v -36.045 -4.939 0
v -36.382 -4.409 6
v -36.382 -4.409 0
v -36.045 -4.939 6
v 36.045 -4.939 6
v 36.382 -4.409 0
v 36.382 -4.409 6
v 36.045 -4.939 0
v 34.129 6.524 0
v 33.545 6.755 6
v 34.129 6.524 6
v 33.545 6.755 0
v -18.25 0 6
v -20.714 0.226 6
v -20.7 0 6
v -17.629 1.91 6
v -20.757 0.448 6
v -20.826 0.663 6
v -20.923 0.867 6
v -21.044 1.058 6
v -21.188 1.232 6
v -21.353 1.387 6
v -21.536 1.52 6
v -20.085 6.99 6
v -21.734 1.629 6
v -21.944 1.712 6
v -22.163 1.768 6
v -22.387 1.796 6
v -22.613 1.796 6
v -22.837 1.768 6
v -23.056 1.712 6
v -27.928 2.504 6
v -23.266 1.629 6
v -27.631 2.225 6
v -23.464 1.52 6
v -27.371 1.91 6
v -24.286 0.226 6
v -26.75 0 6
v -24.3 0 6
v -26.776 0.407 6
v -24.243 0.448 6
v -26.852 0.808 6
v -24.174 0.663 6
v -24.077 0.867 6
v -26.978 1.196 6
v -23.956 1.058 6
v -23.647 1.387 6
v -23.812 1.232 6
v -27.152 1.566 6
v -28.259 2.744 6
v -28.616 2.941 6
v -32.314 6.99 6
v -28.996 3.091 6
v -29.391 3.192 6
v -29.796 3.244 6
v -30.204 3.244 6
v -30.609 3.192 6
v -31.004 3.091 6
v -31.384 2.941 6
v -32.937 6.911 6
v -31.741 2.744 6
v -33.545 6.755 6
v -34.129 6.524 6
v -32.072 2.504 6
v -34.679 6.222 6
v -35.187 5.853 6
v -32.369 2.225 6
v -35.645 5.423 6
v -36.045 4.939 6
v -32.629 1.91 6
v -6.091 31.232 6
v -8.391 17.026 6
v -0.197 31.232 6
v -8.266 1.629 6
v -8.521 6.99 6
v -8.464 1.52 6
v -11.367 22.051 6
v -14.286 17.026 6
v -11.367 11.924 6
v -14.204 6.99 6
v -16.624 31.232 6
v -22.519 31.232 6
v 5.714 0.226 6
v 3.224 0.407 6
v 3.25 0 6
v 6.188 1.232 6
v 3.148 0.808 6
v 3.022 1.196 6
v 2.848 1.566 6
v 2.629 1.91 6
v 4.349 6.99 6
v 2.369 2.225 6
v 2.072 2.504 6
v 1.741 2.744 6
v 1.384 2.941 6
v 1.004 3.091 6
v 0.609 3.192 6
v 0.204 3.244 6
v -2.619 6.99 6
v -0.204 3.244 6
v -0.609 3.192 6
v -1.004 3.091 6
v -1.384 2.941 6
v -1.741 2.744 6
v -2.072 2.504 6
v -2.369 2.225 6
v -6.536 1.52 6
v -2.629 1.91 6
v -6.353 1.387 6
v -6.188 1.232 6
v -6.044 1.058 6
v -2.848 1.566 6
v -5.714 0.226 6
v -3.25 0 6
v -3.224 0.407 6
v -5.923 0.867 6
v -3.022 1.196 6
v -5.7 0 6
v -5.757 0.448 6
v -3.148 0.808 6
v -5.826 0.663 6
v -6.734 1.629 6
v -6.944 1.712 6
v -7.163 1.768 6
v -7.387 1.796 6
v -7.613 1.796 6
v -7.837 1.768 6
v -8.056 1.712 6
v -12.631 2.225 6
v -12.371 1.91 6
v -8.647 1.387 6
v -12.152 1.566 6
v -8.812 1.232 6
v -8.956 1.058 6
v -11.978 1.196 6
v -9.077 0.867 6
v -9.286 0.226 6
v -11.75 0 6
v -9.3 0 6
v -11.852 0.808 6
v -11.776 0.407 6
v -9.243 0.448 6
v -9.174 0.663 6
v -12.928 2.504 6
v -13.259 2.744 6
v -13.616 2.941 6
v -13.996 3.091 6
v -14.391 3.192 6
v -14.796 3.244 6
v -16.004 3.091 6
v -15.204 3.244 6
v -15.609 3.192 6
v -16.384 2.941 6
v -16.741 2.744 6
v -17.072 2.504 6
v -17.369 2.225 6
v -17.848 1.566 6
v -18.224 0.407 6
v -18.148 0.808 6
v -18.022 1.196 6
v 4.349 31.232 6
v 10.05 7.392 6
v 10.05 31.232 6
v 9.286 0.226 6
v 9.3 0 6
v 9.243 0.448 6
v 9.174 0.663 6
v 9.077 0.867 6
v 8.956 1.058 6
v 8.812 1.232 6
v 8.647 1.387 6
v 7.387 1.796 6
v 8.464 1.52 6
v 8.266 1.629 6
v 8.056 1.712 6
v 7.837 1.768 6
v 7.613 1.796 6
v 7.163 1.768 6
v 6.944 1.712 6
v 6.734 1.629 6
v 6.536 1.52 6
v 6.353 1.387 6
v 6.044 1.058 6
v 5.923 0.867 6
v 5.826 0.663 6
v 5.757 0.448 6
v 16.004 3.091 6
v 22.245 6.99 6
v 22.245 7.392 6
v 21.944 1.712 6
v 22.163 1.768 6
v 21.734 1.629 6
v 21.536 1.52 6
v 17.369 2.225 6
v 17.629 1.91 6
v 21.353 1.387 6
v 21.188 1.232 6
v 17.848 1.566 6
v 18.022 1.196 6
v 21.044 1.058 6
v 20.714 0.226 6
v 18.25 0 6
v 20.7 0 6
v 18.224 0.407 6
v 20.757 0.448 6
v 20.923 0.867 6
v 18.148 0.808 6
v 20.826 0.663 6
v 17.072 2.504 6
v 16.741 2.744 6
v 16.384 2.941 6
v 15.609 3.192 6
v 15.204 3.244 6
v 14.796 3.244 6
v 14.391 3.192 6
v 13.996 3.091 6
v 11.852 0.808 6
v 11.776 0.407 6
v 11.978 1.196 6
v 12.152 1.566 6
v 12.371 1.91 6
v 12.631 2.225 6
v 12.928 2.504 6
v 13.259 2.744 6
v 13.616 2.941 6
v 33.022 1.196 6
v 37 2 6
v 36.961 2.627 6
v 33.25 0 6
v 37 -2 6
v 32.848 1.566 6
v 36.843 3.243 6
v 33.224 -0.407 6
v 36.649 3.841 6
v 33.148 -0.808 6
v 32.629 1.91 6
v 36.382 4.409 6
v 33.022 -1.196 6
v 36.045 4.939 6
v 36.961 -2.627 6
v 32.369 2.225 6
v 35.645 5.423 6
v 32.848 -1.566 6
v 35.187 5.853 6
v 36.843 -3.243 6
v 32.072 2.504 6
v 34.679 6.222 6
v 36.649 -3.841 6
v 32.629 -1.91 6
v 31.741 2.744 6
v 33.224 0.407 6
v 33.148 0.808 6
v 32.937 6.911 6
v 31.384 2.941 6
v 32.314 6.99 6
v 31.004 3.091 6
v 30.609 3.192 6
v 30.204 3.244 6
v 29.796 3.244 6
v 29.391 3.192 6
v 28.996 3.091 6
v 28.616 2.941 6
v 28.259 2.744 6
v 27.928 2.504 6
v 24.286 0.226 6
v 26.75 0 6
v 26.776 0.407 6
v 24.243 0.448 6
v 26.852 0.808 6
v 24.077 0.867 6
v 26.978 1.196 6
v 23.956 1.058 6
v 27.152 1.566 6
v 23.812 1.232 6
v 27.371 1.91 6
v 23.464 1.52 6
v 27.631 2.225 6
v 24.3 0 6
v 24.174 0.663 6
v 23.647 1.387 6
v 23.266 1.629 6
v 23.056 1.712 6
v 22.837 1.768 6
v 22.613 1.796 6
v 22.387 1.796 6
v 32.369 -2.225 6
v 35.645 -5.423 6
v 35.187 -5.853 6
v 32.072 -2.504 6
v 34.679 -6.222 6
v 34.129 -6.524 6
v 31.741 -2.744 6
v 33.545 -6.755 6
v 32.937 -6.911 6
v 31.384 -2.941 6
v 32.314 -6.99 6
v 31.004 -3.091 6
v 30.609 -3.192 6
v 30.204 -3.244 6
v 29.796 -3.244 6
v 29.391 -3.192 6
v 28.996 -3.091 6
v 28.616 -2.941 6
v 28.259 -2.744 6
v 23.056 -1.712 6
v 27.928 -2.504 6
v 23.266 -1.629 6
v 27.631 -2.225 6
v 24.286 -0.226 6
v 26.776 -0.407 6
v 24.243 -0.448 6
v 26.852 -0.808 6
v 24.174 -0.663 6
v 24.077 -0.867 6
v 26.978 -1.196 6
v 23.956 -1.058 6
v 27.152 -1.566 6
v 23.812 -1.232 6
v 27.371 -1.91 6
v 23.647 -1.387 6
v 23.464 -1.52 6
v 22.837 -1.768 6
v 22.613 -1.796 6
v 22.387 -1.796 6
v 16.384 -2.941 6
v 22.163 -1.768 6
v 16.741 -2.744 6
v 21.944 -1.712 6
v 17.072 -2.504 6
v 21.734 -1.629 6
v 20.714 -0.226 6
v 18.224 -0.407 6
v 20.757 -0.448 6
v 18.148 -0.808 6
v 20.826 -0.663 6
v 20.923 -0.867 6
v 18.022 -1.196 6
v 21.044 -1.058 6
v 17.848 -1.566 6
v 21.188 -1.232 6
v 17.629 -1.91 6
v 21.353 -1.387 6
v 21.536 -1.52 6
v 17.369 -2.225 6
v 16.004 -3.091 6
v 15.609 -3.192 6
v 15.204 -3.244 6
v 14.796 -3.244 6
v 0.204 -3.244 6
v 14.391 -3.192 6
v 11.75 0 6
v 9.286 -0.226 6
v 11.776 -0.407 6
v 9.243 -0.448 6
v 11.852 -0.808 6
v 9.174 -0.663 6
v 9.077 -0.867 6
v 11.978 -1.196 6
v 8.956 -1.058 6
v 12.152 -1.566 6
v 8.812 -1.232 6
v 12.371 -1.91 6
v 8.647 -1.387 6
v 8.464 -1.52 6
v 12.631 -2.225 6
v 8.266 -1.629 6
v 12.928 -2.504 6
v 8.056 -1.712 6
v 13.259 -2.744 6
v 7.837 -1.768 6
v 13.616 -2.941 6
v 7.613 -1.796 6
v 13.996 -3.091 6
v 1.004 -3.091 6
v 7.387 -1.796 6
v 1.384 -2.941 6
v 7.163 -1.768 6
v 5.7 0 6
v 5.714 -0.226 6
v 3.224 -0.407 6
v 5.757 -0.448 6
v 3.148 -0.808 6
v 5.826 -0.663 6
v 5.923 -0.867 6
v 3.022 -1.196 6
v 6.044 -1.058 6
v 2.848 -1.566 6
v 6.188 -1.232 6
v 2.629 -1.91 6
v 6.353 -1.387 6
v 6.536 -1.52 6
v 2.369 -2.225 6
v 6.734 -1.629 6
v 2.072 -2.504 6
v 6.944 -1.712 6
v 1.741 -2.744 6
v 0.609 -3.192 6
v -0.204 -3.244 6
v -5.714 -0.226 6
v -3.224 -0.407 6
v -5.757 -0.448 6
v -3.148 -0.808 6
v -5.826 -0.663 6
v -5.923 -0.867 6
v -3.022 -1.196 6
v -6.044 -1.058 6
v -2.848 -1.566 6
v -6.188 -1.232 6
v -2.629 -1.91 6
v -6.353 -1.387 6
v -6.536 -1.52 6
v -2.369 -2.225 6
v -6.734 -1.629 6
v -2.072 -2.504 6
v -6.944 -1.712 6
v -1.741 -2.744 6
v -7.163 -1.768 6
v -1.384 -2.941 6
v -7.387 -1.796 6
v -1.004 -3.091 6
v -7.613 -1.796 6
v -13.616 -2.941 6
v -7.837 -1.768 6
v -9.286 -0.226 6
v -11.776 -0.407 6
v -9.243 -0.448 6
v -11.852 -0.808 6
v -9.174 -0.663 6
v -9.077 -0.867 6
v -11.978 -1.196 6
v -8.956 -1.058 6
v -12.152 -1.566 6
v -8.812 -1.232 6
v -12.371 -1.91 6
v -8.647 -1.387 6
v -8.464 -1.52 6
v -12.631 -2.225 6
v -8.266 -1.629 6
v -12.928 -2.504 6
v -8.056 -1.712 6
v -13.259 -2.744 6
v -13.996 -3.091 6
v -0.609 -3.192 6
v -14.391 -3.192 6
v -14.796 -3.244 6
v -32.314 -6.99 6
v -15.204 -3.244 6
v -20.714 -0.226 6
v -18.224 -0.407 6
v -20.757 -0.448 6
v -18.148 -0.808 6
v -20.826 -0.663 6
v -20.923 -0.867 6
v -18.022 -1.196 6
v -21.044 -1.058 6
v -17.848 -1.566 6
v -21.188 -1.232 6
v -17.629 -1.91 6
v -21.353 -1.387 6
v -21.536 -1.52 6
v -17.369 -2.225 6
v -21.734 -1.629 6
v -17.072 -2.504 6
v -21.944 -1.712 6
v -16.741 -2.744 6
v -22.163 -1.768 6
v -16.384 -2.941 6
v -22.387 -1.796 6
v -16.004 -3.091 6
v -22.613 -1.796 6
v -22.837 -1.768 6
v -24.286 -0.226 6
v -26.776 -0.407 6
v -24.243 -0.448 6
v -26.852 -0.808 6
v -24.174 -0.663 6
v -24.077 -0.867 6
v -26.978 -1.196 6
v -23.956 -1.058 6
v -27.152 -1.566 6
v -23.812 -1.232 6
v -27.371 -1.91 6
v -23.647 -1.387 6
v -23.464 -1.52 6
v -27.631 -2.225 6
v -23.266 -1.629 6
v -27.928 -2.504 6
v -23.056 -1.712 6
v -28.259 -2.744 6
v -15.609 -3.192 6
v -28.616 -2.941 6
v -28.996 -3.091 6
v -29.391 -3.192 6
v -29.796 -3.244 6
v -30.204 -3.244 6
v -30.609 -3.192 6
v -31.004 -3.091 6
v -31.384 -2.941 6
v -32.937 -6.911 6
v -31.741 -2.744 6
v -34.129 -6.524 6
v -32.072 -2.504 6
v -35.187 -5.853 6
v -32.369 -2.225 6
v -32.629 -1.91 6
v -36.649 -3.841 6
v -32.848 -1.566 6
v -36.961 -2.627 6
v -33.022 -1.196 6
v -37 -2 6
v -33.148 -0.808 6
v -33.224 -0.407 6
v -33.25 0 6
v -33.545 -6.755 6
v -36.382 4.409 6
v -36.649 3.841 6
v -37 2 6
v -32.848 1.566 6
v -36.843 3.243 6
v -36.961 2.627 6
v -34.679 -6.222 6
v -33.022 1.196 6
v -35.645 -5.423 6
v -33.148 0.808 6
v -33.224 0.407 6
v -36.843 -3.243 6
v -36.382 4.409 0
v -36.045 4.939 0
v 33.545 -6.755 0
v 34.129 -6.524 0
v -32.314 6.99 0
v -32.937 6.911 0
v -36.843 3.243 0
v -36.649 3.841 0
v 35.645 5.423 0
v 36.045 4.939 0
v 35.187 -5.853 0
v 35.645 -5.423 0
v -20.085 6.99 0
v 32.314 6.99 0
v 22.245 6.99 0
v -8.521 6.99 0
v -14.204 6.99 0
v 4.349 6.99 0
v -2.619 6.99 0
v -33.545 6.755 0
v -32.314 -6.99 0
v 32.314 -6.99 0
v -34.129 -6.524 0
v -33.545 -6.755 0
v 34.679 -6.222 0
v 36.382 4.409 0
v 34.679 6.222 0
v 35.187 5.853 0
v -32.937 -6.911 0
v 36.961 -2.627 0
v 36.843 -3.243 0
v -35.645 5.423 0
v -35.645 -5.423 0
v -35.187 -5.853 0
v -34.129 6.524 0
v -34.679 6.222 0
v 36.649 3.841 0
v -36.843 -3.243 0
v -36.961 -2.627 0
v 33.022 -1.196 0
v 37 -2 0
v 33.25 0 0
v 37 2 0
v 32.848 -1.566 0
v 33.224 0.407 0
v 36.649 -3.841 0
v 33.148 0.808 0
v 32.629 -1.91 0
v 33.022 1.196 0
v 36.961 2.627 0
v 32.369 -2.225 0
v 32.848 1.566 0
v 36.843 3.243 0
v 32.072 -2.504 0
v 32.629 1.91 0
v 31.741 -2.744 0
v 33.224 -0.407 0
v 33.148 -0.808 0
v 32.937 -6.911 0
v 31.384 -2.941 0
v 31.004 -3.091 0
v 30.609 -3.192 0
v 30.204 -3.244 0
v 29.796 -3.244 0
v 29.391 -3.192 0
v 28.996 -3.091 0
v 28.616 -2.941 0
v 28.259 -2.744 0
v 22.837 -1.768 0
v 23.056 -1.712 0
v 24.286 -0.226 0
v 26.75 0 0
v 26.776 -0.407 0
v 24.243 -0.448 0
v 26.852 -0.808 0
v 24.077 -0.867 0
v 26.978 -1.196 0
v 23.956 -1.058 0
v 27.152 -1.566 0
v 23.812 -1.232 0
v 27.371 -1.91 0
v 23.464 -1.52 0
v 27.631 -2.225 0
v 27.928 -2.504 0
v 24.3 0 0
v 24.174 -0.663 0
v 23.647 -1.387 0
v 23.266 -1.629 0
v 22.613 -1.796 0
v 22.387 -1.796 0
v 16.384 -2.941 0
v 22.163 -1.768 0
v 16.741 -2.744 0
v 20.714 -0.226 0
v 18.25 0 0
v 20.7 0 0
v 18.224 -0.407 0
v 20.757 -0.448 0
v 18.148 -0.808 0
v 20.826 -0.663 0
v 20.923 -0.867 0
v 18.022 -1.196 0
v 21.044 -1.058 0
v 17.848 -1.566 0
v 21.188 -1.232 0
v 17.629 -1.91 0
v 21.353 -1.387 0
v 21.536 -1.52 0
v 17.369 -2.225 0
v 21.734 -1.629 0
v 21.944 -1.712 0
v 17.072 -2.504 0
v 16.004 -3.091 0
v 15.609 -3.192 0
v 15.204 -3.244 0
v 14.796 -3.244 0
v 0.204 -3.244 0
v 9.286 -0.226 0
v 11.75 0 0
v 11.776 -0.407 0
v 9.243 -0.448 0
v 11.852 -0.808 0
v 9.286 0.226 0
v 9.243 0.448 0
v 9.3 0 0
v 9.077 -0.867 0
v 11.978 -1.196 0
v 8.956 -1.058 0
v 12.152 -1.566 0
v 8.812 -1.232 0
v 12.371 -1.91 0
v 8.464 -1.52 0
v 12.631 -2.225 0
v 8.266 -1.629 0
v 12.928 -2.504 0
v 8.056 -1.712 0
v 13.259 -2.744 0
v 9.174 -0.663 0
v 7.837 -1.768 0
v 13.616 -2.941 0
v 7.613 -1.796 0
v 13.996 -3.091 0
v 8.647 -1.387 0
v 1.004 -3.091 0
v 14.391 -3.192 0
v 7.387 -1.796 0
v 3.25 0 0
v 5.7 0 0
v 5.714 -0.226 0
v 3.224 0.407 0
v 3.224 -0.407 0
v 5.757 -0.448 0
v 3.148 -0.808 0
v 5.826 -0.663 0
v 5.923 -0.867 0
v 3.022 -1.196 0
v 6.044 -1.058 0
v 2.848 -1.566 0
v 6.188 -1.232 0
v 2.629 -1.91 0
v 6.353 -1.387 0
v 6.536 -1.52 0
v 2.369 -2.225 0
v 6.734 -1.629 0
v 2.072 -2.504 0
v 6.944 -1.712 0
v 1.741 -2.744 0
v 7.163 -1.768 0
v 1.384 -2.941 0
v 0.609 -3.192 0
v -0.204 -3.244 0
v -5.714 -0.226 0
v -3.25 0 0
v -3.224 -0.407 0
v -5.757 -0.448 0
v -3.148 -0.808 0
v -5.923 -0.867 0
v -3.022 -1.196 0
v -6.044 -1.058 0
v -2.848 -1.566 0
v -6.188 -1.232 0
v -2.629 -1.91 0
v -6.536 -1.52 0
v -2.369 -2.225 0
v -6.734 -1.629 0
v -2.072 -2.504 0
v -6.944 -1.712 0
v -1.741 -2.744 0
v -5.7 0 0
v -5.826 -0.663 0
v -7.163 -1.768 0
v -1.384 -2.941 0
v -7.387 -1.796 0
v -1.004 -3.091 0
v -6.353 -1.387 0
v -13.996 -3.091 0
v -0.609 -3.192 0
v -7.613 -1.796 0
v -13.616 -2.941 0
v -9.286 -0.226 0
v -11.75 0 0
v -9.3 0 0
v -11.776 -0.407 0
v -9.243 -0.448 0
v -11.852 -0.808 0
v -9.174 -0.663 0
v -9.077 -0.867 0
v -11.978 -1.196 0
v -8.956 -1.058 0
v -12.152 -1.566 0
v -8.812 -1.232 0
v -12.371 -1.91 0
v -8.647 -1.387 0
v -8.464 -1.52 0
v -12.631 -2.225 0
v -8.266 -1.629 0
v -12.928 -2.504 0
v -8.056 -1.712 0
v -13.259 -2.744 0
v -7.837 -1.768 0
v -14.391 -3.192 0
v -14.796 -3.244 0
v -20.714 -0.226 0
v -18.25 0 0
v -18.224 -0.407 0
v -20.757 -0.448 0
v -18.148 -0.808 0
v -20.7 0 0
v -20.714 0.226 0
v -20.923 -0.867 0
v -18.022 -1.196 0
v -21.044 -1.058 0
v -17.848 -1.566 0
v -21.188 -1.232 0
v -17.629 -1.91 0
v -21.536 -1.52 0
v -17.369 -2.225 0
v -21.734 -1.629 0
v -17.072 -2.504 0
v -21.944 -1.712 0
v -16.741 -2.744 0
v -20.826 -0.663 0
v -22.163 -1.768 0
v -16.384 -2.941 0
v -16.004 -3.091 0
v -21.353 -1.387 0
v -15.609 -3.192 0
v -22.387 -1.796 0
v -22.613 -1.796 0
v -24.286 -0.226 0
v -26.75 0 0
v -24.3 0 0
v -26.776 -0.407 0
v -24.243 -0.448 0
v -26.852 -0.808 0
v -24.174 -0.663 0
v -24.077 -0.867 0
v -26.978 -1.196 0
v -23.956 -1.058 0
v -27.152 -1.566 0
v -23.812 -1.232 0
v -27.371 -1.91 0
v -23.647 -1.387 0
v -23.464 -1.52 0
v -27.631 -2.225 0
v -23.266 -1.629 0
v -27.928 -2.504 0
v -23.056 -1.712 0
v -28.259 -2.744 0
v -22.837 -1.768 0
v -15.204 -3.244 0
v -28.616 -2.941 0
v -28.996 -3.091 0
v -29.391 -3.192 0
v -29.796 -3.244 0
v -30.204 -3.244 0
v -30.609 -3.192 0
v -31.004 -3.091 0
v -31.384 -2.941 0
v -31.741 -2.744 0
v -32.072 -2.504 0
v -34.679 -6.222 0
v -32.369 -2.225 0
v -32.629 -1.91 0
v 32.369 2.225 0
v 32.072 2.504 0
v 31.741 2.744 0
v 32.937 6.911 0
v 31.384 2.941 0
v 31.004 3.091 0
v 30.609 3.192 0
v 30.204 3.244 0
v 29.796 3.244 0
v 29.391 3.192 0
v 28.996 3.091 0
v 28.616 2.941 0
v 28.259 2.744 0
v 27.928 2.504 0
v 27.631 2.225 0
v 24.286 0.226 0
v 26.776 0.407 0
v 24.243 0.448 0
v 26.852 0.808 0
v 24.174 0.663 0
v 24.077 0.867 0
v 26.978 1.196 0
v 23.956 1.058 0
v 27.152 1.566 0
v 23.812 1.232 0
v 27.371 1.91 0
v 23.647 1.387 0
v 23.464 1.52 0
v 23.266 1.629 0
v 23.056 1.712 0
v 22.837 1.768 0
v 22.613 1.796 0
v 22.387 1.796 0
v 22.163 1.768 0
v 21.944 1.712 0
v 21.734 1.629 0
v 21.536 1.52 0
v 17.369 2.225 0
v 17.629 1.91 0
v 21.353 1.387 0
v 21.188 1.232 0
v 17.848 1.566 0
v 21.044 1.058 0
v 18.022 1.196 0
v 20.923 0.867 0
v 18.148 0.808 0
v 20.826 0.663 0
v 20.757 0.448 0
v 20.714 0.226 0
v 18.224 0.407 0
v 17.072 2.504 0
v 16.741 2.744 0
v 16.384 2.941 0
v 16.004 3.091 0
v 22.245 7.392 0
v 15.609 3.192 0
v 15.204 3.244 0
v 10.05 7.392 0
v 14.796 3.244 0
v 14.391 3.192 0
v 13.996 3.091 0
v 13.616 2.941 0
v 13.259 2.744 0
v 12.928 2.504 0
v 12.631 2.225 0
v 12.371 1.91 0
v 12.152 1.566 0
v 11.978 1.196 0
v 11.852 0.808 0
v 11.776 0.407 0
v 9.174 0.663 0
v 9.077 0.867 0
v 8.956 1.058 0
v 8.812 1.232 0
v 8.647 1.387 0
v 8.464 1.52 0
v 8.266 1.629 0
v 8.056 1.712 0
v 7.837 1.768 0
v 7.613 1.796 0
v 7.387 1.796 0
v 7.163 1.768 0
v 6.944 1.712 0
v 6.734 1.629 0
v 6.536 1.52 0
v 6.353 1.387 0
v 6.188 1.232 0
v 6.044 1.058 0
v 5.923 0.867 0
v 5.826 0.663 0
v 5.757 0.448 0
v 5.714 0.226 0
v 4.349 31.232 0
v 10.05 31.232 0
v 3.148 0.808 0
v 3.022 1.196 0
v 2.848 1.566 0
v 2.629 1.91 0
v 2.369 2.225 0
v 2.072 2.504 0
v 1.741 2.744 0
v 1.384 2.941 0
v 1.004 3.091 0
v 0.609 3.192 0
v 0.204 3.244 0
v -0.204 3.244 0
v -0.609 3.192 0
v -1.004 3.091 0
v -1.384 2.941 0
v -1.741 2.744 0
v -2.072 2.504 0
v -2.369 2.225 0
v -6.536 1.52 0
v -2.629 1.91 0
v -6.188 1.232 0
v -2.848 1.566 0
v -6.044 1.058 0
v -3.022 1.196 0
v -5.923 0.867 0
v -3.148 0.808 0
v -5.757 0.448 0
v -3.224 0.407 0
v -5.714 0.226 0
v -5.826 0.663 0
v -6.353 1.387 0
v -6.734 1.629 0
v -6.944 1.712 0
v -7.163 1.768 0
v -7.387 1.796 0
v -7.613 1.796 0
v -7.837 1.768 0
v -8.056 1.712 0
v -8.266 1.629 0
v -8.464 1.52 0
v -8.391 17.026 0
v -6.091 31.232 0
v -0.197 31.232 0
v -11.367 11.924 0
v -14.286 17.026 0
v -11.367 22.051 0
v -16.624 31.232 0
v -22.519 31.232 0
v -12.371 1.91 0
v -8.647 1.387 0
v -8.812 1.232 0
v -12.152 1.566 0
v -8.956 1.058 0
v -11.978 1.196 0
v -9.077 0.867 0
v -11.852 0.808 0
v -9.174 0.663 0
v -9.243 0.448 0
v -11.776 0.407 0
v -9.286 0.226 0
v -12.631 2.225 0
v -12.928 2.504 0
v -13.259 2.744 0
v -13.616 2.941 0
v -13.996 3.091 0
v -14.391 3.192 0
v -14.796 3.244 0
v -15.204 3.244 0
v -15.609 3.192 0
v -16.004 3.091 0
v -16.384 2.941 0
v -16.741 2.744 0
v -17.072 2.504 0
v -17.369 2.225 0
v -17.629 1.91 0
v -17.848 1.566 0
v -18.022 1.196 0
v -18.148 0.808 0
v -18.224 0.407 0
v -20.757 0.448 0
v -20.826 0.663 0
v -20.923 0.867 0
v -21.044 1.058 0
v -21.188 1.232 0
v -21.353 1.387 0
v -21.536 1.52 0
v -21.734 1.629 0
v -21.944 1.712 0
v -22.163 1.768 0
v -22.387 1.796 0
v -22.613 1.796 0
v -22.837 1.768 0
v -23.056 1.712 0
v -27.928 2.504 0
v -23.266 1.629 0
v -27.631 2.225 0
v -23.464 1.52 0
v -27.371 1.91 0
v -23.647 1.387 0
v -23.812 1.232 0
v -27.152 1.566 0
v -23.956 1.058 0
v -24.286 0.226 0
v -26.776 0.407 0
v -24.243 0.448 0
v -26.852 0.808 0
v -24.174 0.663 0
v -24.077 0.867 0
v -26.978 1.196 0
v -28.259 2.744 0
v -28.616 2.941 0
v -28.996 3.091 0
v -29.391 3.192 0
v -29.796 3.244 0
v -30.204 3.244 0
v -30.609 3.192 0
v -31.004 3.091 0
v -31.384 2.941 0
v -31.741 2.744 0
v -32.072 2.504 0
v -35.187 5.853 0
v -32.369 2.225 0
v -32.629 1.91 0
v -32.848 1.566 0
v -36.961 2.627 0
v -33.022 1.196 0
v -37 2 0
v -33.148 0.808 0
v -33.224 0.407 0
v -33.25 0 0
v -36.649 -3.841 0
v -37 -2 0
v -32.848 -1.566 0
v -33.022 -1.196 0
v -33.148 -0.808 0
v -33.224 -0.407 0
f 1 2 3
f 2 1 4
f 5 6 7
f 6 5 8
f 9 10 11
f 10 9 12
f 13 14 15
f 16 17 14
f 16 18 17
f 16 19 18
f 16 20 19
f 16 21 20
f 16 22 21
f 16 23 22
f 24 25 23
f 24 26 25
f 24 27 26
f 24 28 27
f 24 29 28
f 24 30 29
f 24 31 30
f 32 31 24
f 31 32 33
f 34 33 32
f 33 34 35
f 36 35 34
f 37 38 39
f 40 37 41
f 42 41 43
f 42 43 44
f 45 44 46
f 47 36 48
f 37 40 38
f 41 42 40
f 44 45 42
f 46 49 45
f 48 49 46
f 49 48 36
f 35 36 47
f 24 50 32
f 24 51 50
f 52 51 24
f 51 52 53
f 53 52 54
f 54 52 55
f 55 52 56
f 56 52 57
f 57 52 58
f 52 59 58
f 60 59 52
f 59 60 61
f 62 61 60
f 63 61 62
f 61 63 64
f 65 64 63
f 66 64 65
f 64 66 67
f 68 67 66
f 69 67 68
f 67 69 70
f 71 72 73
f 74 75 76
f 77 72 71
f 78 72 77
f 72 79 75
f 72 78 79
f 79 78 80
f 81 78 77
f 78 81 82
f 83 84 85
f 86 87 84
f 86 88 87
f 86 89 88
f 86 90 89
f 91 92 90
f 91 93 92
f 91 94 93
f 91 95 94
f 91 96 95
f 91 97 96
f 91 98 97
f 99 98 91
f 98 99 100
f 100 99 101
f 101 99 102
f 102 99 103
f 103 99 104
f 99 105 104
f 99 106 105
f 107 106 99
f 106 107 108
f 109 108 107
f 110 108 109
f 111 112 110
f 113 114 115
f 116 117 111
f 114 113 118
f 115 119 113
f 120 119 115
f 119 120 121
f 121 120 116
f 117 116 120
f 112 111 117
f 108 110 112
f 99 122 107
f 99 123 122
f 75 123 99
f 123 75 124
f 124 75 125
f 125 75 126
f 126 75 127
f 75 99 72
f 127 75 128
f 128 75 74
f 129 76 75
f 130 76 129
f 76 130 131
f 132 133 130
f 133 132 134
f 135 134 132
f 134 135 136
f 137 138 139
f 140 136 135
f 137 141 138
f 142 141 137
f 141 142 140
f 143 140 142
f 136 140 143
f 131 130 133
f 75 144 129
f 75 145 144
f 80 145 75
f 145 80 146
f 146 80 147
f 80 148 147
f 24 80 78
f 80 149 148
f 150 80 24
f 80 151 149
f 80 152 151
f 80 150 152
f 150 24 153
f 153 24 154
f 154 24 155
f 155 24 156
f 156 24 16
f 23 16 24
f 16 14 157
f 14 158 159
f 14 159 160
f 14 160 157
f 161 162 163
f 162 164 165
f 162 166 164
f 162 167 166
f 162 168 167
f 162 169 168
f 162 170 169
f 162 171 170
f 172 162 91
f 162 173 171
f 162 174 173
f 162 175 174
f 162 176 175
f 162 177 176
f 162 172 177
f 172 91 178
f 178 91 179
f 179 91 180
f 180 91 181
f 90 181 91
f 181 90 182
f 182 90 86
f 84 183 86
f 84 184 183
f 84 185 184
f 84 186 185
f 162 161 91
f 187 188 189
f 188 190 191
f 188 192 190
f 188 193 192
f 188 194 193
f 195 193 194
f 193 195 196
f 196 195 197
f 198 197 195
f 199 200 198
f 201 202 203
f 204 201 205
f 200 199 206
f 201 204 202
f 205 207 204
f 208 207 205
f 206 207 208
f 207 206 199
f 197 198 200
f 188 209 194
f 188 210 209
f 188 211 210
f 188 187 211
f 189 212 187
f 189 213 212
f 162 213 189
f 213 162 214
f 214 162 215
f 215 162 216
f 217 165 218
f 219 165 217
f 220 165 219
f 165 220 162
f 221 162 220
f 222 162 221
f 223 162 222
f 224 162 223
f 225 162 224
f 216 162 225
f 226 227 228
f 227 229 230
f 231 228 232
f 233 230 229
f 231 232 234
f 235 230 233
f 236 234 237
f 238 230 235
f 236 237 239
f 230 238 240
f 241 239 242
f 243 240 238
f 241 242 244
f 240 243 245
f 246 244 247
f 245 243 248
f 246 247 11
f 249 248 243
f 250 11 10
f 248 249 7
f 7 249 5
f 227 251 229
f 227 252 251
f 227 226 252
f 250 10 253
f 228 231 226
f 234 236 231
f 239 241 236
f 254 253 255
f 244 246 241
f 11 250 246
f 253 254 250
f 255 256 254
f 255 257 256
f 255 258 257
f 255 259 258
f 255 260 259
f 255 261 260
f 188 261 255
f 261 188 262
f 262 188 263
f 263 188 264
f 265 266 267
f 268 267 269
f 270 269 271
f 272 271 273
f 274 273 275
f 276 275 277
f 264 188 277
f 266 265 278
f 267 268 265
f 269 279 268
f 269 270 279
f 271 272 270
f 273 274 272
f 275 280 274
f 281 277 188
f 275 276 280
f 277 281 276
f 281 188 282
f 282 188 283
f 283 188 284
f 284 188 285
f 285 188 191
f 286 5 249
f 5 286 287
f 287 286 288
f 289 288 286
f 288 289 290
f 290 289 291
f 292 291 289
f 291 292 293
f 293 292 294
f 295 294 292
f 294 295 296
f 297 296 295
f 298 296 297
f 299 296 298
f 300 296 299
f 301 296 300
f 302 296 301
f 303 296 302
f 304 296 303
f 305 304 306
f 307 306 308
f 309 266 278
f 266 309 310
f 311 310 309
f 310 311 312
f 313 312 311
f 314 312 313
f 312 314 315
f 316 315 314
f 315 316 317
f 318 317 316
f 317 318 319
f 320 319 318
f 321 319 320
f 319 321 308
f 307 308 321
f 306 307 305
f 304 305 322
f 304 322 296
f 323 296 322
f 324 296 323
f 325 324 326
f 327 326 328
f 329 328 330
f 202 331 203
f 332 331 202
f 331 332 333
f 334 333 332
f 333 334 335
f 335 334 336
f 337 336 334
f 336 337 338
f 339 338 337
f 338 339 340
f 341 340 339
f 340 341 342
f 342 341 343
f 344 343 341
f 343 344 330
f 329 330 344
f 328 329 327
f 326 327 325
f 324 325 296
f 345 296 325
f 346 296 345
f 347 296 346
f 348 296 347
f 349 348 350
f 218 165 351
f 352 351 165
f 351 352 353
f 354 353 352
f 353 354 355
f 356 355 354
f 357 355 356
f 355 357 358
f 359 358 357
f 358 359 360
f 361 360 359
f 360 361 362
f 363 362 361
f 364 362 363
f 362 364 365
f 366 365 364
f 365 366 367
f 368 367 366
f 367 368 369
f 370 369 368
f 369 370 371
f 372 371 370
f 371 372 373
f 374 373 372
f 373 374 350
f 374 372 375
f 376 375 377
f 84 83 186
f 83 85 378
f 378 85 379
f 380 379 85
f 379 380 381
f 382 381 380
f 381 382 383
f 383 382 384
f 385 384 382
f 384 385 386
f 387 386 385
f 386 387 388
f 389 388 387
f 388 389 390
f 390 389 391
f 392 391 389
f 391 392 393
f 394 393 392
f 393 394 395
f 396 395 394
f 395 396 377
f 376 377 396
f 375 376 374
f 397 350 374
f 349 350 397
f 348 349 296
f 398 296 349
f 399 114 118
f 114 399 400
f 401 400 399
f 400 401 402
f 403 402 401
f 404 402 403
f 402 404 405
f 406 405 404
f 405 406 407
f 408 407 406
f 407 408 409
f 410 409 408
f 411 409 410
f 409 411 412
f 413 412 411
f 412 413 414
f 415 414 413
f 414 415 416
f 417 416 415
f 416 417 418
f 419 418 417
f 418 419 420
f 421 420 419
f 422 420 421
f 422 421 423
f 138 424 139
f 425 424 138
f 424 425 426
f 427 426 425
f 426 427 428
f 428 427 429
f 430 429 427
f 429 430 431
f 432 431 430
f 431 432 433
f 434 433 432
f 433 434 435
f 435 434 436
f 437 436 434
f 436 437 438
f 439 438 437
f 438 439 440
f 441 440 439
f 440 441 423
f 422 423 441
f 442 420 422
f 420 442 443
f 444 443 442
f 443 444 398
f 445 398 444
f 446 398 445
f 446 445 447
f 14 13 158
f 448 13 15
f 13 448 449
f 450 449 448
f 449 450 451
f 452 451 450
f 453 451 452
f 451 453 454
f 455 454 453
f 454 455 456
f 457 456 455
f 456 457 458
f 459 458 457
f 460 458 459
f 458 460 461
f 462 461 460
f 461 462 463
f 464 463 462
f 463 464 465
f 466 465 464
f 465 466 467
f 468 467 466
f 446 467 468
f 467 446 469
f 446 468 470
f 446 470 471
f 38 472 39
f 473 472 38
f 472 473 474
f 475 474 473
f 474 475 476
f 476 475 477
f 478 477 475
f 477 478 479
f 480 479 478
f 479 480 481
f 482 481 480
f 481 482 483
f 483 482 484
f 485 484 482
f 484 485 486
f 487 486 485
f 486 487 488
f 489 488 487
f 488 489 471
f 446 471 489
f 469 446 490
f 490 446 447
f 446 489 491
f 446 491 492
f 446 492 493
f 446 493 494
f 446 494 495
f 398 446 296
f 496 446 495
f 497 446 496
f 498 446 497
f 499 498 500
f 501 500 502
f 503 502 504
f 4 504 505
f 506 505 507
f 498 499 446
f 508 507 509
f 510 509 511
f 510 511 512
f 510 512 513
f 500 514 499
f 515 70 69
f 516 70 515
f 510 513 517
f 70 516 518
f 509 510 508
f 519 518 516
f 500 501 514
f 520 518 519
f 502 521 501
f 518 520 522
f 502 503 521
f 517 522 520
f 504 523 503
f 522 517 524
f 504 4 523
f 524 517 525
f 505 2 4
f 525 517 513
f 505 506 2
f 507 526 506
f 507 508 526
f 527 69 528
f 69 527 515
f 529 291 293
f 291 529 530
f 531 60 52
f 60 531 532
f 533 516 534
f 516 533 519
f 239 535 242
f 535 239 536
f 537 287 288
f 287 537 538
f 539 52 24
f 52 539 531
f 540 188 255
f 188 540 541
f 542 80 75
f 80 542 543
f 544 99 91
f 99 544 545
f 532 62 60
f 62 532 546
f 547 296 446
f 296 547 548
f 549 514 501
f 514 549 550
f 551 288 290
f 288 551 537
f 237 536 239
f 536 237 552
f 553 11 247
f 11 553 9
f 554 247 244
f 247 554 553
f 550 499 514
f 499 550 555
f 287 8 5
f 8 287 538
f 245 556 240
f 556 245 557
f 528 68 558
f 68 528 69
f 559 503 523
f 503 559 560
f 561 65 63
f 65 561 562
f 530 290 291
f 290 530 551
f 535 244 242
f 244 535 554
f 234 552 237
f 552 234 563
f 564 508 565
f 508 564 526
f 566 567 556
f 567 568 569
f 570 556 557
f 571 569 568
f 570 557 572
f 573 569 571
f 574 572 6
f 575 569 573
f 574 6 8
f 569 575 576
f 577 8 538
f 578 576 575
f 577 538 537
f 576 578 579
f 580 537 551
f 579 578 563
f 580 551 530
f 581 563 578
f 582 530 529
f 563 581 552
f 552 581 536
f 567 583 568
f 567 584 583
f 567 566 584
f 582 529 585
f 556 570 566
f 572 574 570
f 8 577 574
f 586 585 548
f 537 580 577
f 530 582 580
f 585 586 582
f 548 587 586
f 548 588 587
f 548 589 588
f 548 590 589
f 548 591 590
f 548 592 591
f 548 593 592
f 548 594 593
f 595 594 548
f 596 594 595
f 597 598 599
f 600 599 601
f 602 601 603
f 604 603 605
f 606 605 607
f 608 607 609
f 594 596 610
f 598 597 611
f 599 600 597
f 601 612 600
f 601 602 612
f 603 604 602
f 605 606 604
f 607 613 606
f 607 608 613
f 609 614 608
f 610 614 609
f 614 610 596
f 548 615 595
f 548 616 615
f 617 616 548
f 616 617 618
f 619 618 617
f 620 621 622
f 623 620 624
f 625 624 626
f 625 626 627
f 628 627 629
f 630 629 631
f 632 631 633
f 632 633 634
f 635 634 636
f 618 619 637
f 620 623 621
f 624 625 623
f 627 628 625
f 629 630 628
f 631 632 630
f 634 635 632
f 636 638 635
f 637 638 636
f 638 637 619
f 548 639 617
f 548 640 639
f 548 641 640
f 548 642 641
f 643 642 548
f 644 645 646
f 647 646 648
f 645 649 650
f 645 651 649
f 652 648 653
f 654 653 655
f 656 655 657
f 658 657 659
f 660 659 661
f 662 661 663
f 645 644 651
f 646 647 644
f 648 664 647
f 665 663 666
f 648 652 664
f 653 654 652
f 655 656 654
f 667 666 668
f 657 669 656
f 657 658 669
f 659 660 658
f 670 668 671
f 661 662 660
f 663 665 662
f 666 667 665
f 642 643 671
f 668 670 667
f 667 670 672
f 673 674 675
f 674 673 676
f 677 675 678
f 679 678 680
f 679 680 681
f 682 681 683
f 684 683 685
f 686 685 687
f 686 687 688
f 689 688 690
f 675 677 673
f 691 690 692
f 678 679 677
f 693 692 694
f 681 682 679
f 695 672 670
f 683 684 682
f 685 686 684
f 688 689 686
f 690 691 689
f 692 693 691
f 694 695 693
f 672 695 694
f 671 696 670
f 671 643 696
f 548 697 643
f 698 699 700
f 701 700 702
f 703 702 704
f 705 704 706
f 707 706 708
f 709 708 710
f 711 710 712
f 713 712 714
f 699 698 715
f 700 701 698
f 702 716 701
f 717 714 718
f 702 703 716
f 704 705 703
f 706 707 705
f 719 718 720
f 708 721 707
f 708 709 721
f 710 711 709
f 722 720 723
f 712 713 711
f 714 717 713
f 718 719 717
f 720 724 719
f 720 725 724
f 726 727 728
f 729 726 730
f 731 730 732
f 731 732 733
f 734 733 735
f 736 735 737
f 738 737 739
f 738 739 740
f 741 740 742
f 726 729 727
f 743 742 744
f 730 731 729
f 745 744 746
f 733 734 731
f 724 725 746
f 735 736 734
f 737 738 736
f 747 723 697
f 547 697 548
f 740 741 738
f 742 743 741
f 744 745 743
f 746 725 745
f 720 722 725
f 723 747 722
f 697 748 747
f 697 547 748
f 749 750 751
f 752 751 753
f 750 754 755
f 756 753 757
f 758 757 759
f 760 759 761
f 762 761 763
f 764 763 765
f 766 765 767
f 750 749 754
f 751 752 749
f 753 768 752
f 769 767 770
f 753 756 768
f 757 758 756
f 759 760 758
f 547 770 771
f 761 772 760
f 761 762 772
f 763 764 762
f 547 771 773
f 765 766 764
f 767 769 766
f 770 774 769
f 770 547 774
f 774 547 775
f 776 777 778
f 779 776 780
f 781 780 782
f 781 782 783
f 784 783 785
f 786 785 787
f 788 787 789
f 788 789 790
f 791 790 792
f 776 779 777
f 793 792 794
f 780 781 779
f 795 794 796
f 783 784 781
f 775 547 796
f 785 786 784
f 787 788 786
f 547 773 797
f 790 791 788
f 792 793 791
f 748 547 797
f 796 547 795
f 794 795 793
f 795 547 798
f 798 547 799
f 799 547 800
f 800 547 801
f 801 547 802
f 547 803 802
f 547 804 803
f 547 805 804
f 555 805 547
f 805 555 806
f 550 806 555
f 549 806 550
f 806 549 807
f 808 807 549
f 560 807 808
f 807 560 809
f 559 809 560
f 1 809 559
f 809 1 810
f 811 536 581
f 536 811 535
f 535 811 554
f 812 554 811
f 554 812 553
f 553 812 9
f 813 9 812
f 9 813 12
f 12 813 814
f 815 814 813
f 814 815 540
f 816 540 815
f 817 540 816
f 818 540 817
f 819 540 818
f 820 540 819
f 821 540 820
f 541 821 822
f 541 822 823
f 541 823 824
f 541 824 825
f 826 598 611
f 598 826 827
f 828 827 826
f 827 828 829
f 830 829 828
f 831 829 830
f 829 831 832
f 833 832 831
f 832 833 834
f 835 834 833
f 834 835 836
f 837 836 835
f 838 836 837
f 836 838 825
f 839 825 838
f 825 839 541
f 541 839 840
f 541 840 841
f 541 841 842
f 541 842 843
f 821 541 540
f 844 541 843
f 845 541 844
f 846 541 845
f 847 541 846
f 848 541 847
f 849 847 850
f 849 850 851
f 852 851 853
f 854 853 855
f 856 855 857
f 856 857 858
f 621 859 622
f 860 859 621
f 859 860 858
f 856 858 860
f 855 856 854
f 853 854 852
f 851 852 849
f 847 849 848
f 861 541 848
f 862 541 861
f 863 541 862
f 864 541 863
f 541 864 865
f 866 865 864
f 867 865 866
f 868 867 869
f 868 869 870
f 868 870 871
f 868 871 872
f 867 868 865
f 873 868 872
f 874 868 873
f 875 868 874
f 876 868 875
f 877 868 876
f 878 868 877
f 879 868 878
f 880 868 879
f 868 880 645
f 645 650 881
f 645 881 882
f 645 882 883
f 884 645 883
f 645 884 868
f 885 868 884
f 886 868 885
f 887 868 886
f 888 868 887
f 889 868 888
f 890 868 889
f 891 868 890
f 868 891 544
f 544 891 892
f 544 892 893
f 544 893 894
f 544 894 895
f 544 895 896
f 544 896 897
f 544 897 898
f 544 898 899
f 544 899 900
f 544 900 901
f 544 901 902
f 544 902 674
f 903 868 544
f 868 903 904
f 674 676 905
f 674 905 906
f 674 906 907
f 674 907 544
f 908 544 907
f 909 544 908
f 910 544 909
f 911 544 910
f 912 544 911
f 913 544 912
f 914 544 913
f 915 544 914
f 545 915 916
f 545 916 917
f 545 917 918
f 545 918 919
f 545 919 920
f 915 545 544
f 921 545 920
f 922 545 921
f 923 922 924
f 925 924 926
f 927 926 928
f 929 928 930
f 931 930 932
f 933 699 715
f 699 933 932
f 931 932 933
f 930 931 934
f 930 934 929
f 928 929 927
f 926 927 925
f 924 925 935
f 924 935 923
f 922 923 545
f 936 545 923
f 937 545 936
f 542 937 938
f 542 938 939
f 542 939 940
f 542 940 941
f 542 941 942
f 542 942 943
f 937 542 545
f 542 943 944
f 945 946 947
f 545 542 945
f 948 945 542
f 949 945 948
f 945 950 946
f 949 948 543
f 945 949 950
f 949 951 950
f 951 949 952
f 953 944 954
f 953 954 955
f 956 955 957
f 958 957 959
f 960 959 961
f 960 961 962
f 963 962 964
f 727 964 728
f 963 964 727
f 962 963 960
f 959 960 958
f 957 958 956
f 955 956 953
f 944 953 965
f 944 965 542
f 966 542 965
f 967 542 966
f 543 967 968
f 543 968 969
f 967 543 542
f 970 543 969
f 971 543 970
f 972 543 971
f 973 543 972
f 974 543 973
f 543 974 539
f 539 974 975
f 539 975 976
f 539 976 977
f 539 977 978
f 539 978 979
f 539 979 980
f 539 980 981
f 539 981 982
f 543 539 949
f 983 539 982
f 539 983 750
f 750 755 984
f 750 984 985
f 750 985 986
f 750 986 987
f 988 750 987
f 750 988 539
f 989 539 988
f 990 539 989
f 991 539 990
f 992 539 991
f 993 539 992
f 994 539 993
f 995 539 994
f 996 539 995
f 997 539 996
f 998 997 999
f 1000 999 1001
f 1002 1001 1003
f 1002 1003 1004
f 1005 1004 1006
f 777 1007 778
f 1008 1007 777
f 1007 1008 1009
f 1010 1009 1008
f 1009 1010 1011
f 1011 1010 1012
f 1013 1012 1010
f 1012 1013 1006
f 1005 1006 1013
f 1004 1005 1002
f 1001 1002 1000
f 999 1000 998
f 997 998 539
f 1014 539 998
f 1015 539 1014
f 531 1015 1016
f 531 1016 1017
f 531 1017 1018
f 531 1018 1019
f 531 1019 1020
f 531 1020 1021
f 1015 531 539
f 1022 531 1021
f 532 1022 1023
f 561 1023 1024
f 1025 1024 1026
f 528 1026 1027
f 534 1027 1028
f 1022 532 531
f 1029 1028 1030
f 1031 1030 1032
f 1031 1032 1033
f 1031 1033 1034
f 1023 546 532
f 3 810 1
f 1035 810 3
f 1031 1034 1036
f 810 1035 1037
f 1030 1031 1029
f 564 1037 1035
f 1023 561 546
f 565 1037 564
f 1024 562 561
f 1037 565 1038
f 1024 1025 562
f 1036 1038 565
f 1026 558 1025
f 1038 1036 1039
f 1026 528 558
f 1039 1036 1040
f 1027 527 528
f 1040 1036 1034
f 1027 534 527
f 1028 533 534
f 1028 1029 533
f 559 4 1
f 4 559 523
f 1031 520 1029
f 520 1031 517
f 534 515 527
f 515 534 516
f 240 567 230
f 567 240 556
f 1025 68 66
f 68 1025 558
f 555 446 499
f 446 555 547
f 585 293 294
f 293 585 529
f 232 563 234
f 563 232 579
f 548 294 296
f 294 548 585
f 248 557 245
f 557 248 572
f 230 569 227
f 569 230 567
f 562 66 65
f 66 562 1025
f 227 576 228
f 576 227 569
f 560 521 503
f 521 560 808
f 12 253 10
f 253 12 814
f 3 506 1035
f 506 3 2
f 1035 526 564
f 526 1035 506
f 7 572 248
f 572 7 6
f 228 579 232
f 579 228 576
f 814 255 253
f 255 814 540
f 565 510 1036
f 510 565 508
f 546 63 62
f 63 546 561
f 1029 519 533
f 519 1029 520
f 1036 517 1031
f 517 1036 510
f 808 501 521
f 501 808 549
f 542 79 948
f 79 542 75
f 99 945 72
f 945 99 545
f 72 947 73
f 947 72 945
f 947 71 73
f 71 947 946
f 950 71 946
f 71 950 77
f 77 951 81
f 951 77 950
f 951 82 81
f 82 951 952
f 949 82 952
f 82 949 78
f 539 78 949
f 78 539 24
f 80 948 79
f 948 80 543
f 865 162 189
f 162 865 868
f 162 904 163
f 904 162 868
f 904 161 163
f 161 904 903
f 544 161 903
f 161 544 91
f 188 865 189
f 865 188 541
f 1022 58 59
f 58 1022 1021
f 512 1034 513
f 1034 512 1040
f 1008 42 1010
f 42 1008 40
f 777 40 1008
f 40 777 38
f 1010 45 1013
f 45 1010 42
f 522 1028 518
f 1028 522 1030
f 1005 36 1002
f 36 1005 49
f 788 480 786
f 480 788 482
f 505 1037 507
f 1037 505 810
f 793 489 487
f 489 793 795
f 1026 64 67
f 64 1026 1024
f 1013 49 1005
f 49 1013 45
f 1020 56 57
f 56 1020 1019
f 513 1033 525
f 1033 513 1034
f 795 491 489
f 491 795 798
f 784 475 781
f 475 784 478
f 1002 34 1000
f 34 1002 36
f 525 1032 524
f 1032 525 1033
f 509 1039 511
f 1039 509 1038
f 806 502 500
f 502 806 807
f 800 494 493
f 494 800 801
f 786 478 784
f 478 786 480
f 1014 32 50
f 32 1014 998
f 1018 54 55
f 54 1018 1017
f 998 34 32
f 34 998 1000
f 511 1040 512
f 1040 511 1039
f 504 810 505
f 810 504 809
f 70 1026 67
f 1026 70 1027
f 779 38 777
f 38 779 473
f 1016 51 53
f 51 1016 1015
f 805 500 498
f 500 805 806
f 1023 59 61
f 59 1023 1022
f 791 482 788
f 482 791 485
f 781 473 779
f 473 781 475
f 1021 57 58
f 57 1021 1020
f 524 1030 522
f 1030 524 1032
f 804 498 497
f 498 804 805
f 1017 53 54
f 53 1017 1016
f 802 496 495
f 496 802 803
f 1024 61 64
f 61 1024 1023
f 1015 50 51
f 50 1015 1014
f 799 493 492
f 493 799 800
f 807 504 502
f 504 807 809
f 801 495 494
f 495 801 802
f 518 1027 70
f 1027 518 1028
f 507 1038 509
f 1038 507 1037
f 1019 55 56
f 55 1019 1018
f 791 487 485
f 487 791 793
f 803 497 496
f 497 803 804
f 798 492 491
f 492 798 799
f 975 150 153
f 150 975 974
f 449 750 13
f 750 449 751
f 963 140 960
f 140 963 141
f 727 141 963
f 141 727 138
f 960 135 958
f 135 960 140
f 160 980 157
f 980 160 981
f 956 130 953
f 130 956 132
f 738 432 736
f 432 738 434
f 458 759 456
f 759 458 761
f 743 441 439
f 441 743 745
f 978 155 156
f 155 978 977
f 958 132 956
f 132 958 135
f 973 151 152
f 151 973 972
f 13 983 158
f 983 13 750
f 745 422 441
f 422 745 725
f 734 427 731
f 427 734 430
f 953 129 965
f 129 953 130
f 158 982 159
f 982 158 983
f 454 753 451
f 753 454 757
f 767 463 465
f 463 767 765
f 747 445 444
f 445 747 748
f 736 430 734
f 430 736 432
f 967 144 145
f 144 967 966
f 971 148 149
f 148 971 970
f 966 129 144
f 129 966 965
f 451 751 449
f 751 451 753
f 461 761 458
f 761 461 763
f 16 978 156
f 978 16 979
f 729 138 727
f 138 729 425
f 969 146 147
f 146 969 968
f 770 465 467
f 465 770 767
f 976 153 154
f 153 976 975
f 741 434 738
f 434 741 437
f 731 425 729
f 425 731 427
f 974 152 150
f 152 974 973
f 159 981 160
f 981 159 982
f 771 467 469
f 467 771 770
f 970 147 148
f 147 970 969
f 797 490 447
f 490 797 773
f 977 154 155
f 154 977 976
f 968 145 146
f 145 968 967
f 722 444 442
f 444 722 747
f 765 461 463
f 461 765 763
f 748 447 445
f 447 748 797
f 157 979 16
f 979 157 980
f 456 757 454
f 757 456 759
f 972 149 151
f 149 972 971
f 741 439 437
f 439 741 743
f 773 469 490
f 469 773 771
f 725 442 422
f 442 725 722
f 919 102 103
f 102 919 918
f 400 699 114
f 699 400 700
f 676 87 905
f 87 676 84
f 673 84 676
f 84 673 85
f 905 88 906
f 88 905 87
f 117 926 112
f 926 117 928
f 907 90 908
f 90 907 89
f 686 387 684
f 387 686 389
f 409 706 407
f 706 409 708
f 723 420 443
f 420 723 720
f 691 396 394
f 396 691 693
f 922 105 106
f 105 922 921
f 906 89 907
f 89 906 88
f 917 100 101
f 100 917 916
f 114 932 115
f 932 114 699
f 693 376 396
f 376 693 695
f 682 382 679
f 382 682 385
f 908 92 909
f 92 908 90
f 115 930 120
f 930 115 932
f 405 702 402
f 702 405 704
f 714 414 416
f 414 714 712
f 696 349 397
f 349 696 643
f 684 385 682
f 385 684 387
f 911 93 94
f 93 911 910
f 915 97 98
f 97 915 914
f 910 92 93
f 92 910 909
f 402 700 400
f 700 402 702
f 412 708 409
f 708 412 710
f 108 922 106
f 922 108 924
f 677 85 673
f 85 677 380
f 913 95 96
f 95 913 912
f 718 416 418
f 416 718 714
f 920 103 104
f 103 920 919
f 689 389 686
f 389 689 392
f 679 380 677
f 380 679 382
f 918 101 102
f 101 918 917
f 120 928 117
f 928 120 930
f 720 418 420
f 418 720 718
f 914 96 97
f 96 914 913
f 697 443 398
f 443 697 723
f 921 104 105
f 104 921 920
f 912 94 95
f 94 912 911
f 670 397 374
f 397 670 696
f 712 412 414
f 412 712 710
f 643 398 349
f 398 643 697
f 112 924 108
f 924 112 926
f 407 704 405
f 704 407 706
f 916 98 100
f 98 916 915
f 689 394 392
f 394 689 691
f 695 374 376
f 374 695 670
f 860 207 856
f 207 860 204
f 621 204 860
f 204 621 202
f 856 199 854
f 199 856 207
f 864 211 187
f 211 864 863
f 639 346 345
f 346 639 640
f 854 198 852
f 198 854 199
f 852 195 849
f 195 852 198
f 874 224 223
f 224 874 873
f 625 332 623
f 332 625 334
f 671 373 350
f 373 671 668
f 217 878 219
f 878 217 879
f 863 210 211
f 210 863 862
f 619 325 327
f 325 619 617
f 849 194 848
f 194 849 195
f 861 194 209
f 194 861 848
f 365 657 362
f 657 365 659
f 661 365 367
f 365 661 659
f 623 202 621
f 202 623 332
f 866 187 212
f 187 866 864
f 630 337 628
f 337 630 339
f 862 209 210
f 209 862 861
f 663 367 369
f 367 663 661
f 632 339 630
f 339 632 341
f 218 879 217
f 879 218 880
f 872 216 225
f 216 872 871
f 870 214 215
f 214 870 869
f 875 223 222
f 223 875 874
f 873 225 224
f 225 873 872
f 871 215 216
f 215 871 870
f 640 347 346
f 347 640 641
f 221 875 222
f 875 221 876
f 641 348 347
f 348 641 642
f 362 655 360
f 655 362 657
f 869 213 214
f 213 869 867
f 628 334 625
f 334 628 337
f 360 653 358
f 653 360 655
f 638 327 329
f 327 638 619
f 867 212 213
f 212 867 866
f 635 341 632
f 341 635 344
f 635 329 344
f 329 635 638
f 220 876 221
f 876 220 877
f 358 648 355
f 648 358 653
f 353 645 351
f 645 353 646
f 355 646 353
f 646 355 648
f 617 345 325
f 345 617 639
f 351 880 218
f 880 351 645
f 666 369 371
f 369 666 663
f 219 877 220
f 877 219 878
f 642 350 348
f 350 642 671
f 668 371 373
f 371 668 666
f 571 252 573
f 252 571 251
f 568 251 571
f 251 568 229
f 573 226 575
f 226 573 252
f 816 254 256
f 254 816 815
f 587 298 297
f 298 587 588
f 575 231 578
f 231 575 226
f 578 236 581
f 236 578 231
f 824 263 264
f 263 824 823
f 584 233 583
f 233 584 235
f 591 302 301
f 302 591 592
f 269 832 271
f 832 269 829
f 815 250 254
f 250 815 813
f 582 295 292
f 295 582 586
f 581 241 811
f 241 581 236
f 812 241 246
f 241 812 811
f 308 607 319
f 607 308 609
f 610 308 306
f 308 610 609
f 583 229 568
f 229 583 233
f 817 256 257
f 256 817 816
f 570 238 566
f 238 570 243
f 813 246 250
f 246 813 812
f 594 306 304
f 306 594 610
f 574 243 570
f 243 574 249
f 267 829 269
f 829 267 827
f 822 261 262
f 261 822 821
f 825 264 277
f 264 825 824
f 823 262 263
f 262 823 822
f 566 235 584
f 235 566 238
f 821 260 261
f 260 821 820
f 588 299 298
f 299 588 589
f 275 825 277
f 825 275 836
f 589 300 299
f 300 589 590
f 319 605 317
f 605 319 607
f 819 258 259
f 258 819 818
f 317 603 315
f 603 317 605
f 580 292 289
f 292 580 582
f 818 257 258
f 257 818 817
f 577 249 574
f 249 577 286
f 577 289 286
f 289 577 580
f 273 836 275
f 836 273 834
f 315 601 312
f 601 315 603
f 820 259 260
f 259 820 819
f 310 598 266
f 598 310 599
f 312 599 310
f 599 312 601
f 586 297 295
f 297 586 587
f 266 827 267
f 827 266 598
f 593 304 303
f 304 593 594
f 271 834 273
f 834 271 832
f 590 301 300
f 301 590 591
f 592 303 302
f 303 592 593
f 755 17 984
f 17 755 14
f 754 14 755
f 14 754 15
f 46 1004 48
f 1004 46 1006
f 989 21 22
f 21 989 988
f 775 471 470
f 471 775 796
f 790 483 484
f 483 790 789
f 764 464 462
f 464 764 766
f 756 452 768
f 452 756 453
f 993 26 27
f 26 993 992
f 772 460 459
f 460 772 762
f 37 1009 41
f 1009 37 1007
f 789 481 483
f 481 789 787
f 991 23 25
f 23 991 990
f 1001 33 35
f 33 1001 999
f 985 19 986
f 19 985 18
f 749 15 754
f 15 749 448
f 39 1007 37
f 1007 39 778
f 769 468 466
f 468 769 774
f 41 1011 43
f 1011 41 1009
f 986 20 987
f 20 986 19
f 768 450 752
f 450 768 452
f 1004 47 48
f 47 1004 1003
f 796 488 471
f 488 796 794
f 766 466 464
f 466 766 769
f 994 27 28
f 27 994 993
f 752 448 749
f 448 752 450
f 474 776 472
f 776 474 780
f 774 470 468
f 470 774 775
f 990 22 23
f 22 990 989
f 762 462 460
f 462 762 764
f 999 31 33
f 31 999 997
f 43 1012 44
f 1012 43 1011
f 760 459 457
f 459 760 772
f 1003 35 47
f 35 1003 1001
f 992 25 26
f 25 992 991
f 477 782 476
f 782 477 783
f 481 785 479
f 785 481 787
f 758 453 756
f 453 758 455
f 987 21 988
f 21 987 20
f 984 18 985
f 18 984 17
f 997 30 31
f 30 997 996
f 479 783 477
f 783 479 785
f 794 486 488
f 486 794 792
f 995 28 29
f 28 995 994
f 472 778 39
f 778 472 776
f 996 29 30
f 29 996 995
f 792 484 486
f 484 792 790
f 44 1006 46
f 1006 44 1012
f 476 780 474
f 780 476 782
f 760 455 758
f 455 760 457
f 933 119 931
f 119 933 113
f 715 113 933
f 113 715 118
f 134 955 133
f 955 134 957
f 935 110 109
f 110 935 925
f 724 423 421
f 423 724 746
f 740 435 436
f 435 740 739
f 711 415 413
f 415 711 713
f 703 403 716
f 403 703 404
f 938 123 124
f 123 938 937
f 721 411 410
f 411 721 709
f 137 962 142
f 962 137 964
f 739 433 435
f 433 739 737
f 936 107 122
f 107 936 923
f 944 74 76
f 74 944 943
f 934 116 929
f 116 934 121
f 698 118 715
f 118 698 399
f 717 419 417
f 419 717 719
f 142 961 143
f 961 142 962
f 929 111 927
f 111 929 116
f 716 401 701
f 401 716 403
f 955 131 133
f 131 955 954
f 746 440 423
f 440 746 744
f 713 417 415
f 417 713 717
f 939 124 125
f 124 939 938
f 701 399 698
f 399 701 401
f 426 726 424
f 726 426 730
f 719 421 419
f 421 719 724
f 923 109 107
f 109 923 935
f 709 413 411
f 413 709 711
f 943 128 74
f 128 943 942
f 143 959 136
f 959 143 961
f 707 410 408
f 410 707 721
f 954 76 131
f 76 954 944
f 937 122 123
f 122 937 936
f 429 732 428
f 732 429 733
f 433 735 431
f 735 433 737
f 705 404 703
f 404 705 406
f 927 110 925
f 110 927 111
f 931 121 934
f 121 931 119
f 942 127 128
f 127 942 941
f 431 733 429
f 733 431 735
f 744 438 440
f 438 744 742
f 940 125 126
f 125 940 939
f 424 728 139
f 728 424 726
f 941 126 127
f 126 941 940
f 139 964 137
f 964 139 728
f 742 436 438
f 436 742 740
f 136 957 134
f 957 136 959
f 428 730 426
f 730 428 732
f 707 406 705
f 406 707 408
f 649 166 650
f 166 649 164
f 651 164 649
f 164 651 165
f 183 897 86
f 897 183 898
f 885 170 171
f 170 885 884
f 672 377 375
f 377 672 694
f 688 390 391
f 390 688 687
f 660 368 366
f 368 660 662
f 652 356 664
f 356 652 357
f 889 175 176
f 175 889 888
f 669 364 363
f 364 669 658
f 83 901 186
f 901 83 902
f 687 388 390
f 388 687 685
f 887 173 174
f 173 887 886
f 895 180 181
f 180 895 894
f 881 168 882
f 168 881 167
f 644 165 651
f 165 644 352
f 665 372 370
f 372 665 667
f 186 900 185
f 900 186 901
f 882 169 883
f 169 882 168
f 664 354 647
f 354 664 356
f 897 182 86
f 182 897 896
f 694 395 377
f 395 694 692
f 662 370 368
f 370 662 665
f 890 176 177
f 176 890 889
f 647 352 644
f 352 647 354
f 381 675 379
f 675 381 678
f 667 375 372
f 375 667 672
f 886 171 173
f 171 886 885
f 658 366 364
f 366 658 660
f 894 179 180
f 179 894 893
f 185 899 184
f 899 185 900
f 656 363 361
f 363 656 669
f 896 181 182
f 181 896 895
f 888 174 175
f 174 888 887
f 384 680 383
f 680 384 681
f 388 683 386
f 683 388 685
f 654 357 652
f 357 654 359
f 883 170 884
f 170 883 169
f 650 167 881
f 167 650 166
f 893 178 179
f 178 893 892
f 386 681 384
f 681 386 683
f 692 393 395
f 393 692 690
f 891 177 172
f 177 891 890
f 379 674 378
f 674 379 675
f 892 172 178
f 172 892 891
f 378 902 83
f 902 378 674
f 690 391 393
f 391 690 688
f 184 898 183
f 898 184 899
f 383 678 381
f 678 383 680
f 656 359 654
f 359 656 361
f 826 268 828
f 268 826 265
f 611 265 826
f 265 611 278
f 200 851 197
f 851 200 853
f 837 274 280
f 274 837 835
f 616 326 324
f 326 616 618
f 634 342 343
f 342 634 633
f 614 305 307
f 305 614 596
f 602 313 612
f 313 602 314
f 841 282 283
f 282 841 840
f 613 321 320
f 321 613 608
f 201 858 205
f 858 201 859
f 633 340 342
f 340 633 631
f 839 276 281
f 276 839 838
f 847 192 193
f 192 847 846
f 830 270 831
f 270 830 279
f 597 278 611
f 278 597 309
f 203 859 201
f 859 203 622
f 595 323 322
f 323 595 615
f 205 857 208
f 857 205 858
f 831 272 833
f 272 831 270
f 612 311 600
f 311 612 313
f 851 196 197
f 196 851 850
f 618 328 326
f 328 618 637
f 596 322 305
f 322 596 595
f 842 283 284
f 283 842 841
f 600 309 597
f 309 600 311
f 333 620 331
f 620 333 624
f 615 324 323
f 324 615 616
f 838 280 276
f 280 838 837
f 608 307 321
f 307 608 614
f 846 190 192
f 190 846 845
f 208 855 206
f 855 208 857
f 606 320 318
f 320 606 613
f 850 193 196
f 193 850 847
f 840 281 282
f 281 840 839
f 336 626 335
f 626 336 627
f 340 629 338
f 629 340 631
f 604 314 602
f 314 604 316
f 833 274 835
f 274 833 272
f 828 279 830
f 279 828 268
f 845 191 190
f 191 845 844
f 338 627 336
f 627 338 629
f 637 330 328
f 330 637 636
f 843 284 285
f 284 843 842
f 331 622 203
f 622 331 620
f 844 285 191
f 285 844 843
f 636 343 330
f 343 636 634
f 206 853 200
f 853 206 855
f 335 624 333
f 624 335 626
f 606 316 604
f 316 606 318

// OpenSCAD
$fn = 50;


difference() {
	union() {
		hull() {
			translate(v = [-32.0000000000, 2.0000000000, 0]) {
				cylinder(h = 6, r = 5);
			}
			translate(v = [32.0000000000, 2.0000000000, 0]) {
				cylinder(h = 6, r = 5);
			}
			translate(v = [-32.0000000000, -2.0000000000, 0]) {
				cylinder(h = 6, r = 5);
			}
			translate(v = [32.0000000000, -2.0000000000, 0]) {
				cylinder(h = 6, r = 5);
			}
		}
		translate(v = [0, 30.5555555556, 0]) {
			linear_extrude(height = 6) {
				text(font = "DejaVu Sans Mono:style=Bold", halign = "center", size = 28.5000000000, text = "XL", valign = "top");
			}
		}
	}
	union() {
		translate(v = [-30.0000000000, 0.0000000000, 0]) {
			translate(v = [0, 0, -100]) {
				cylinder(h = 200, r = 3.2500000000);
			}
		}
		translate(v = [-15.0000000000, 0.0000000000, 0]) {
			translate(v = [0, 0, -100]) {
				cylinder(h = 200, r = 3.2500000000);
			}
		}
		translate(v = [0, 0, -100]) {
			cylinder(h = 200, r = 3.2500000000);
		}
		translate(v = [15.0000000000, 0.0000000000, 0]) {
			translate(v = [0, 0, -100]) {
				cylinder(h = 200, r = 3.2500000000);
			}
		}
		translate(v = [30.0000000000, 0.0000000000, 0]) {
			translate(v = [0, 0, -100]) {
				cylinder(h = 200, r = 3.2500000000);
			}
		}
		translate(v = [-30.0000000000, 0.0000000000, 0]) {
			translate(v = [0, 0, -100]) {
				cylinder(h = 200, r = 1.8000000000);
			}
		}
		translate(v = [-22.5000000000, 0.0000000000, 0]) {
			translate(v = [0, 0, -100]) {
				cylinder(h = 200, r = 1.8000000000);
			}
		}
		translate(v = [-15.0000000000, 0.0000000000, 0]) {
			translate(v = [0, 0, -100]) {
				cylinder(h = 200, r = 1.8000000000);
			}
		}
		translate(v = [-7.5000000000, 0.0000000000, 0]) {
			translate(v = [0, 0, -100]) {
				cylinder(h = 200, r = 1.8000000000);
			}
		}
		translate(v = [0, 0, -100]) {
			cylinder(h = 200, r = 1.8000000000);
		}
		translate(v = [7.5000000000, 0.0000000000, 0]) {
			translate(v = [0, 0, -100]) {
				cylinder(h = 200, r = 1.8000000000);
			}
		}
		translate(v = [15.0000000000, 0.0000000000, 0]) {
			translate(v = [0, 0, -100]) {
				cylinder(h = 200, r = 1.8000000000);
			}
		}
		translate(v = [22.5000000000, 0.0000000000, 0]) {
			translate(v = [0, 0, -100]) {
				cylinder(h = 200, r = 1.8000000000);
			}
		}
		translate(v = [30.0000000000, 0.0000000000, 0]) {
			translate(v = [0, 0, -100]) {
				cylinder(h = 200, r = 1.8000000000);
			}
		}
	}
}
